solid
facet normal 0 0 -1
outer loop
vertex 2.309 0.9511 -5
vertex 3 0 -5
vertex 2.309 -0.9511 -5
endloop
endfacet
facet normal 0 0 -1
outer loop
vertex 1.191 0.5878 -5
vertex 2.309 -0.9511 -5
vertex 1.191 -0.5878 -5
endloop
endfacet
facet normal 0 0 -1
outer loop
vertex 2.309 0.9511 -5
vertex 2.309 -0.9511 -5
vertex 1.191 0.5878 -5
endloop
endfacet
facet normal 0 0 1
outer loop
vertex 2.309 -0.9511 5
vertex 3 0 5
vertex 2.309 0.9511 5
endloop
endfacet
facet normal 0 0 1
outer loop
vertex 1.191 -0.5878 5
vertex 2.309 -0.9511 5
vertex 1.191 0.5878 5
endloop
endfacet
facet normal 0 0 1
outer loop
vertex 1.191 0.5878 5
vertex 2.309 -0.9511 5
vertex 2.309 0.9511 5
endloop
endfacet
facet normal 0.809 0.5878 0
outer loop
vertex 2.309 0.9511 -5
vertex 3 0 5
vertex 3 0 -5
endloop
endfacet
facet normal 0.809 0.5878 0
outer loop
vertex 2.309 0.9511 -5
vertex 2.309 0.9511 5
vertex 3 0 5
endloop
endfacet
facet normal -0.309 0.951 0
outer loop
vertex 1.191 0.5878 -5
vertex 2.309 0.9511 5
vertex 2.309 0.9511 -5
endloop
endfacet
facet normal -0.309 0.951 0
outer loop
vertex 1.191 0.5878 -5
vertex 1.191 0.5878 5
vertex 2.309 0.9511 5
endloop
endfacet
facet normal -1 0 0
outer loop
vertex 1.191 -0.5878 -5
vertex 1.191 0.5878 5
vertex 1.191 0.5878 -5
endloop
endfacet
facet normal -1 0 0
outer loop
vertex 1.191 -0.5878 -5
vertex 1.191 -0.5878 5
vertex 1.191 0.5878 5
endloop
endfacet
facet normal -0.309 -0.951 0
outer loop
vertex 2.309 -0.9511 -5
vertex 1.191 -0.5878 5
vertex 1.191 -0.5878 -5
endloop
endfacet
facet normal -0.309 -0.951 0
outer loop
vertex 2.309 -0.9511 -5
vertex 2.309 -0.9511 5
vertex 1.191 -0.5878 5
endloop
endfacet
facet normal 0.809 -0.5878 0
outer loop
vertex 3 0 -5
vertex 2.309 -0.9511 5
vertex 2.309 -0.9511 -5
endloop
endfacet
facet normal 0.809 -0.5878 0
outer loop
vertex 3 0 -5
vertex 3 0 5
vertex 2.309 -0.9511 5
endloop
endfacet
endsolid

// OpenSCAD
linear_extrude(height = 10, center = true, convexity = 10, twist = 0)
translate([2, 0, 0])
circle(r = 1);
